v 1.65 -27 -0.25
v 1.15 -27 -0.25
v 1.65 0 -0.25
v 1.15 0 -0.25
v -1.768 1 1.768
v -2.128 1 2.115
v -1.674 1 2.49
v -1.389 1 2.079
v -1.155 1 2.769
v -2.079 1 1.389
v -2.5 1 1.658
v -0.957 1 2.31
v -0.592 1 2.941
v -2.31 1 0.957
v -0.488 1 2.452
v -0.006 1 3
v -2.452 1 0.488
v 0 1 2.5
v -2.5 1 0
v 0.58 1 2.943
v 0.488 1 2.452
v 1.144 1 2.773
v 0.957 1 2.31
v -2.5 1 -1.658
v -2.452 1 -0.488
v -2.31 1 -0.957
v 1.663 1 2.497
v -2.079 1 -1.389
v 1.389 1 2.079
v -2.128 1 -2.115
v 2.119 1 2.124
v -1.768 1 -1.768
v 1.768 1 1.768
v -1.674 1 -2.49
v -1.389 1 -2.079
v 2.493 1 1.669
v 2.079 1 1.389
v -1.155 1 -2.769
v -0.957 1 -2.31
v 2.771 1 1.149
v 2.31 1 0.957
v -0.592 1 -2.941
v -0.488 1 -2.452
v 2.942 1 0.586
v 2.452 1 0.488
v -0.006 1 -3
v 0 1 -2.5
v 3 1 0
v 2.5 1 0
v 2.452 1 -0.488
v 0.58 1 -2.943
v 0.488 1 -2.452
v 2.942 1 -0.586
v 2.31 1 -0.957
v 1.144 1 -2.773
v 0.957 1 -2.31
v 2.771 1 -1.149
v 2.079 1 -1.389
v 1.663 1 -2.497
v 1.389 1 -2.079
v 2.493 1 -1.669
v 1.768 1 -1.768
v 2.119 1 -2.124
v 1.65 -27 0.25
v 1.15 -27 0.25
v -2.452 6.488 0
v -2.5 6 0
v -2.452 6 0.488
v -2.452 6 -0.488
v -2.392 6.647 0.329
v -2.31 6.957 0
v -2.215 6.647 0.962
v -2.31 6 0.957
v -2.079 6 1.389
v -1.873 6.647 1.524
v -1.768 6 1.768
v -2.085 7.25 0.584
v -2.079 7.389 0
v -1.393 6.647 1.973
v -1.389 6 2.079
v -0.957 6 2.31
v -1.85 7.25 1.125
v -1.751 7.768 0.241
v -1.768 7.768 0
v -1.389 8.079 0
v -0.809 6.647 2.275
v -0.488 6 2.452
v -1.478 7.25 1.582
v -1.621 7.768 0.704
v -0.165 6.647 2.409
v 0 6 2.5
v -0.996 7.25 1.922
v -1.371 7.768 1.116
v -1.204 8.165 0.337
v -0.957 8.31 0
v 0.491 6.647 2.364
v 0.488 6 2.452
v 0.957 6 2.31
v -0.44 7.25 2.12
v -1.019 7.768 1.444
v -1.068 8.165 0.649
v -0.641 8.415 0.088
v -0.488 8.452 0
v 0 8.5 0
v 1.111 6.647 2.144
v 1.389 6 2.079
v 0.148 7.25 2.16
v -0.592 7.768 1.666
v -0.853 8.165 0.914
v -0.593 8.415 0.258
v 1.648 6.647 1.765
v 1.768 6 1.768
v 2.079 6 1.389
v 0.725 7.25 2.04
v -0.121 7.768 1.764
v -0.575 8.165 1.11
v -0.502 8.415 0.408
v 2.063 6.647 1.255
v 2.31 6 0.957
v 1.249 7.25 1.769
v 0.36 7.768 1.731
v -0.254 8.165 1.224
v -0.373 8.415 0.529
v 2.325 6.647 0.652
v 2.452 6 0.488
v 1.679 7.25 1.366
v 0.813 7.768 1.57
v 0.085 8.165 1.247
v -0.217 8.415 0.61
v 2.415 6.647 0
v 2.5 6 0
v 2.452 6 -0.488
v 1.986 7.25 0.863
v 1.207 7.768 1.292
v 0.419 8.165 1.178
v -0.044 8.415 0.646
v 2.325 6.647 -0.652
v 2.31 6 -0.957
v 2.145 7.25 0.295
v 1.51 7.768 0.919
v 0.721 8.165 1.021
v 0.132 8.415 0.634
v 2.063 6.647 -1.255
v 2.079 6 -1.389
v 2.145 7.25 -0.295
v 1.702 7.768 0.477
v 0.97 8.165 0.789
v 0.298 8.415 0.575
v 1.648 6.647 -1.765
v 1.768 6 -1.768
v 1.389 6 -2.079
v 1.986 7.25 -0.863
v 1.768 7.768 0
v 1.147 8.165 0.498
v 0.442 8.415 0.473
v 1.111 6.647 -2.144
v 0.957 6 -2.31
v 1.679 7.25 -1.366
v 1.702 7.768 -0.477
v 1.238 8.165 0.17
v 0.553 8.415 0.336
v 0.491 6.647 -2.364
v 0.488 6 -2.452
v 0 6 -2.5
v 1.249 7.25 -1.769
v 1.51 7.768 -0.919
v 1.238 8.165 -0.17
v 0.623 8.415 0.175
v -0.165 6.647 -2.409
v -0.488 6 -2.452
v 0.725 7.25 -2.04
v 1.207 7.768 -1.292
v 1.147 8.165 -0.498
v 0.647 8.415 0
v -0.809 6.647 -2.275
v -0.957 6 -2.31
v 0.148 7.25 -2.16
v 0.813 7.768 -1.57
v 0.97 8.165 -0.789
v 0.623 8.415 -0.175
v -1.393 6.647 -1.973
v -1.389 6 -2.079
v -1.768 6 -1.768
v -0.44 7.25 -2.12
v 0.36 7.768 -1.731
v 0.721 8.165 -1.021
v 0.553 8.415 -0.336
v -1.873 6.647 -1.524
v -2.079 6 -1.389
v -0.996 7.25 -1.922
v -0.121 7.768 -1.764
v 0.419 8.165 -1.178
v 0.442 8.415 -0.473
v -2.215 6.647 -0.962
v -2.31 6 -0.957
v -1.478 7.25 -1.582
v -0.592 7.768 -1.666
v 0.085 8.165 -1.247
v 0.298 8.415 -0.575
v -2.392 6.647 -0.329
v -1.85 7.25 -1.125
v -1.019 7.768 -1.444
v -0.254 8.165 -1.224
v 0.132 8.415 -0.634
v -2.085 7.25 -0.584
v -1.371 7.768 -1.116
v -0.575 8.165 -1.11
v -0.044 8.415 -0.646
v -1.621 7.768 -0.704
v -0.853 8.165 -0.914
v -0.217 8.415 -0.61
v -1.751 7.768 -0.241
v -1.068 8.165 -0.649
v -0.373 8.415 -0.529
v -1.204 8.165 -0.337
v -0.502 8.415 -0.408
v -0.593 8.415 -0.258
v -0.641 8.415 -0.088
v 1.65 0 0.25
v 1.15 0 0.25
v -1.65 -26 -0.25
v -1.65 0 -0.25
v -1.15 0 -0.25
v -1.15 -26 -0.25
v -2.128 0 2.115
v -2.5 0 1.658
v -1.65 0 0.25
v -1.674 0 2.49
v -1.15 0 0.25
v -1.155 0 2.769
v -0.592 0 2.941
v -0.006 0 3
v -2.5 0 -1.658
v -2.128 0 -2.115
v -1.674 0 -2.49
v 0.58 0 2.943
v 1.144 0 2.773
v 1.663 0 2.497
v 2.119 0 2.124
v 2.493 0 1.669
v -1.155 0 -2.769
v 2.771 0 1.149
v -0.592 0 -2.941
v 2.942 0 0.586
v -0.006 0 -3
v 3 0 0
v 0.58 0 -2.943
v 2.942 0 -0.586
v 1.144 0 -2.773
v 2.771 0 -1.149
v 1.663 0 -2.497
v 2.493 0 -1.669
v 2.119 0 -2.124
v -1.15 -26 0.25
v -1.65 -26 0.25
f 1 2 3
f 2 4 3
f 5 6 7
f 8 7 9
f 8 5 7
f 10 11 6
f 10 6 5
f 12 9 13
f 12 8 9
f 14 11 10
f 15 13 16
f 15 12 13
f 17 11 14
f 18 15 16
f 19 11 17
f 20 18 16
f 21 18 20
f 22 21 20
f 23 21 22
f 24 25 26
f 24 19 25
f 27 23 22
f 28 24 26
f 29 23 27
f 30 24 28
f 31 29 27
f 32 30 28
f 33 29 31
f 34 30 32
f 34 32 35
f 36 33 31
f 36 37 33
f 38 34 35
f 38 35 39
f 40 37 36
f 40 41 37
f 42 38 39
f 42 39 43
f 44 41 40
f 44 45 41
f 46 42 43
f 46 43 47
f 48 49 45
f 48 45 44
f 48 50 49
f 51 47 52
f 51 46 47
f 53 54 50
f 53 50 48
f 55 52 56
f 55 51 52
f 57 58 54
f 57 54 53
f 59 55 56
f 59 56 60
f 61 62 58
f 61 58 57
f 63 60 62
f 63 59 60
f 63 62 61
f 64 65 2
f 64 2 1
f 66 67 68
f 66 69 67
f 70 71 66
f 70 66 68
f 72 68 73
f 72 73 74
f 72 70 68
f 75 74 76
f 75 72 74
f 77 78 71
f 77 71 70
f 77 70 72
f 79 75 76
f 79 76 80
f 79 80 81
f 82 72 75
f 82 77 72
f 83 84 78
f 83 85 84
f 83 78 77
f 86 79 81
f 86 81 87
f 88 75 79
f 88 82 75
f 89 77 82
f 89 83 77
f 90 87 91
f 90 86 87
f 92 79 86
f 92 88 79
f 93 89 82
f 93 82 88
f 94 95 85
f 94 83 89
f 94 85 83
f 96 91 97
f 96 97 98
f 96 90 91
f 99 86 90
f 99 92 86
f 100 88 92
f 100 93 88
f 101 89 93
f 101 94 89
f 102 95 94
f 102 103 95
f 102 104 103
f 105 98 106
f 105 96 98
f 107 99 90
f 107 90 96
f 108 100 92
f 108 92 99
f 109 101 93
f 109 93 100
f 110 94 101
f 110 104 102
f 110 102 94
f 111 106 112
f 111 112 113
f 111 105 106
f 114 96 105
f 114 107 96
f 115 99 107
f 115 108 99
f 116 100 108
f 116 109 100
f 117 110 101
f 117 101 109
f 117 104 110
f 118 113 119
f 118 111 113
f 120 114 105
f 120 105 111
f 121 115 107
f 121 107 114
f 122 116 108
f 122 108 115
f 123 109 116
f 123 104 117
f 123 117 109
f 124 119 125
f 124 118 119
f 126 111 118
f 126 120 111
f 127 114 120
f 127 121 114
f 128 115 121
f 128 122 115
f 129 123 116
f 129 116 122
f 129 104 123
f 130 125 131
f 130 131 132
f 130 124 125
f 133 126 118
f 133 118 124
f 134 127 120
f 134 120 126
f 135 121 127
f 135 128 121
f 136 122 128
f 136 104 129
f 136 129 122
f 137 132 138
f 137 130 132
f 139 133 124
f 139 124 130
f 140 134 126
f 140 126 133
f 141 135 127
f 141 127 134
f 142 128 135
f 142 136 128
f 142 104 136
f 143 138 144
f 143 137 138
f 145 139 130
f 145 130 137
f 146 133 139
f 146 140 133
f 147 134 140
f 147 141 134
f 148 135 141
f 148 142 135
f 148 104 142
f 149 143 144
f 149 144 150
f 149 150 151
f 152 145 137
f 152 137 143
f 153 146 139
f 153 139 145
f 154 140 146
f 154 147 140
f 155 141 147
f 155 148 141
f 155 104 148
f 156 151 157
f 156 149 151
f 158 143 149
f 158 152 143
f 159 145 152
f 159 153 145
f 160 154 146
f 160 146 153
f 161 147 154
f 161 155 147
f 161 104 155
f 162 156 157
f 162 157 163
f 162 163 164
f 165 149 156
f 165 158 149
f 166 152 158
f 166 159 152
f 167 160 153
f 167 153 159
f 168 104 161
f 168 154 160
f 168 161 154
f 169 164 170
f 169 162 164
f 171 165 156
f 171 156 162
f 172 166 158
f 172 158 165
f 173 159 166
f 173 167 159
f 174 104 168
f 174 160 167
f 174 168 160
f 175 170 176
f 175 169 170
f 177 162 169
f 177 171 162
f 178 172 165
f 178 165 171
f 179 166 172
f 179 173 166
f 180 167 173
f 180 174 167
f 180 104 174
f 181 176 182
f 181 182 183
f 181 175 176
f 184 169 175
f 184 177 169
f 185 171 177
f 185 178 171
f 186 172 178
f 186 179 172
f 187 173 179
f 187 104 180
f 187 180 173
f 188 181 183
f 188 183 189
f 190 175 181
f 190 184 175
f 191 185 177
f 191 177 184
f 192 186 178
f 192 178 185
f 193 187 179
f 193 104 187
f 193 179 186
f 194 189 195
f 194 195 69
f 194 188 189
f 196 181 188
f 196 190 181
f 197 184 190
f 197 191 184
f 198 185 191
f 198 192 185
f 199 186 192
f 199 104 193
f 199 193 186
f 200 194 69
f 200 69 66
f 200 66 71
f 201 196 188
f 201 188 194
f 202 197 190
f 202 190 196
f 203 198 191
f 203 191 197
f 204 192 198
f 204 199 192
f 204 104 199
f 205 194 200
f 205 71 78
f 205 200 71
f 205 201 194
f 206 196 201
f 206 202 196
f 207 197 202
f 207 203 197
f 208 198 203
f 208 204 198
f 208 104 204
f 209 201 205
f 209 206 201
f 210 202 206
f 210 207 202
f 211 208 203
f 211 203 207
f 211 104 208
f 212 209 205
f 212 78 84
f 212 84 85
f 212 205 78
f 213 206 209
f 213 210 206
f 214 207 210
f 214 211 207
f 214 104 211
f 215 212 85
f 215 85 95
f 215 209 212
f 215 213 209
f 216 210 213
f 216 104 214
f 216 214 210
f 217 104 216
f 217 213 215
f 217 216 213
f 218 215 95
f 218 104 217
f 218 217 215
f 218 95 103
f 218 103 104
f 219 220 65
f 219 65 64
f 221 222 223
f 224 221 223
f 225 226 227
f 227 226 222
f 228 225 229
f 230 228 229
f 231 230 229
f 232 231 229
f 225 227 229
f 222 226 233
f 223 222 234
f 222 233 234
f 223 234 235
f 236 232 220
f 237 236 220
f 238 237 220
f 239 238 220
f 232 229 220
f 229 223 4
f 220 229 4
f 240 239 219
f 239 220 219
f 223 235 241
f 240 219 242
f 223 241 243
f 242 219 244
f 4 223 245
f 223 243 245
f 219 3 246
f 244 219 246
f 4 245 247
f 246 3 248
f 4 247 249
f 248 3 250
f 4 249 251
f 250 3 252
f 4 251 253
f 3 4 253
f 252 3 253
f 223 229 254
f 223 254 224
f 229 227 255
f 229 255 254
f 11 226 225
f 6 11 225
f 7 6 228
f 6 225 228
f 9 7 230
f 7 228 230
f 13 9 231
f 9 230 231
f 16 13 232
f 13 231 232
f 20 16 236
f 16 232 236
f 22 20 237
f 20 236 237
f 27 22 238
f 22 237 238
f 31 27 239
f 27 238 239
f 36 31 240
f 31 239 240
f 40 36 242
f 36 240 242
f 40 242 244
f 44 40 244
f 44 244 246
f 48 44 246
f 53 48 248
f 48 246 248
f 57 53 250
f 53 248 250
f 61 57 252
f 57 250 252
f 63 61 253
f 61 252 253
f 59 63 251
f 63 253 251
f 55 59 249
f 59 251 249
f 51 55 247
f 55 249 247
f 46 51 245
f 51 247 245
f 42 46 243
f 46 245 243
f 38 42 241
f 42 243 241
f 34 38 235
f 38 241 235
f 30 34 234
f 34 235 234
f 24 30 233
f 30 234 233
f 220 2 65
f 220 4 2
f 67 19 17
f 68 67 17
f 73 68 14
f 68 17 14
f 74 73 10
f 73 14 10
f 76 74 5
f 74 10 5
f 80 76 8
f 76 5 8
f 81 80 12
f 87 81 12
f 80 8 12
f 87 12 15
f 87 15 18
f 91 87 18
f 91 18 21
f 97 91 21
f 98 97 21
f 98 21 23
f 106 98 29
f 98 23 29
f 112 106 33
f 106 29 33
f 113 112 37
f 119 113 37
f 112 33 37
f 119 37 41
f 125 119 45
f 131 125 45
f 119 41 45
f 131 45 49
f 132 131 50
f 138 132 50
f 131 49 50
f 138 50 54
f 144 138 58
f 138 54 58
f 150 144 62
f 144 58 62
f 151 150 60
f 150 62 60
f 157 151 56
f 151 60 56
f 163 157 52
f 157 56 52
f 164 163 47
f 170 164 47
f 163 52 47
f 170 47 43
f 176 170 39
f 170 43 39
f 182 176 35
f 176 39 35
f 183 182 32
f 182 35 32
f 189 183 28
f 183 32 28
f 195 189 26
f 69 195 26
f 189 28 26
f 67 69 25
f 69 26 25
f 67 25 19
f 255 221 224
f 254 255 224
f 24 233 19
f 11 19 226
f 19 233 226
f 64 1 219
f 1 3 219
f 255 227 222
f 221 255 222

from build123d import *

# Parameters (mm, degrees)
BOSS_EXTRUDE1_DEPTH = 1
SKETCH2_R           = 2.5
BOSS_EXTRUDE2_DEPTH = 7.5
FILLET1_R           = 2.5
SKETCH3_W           = 0.5
SKETCH3_H           = 0.5
BOSS_EXTRUDE3_DEPTH = 26
SKETCH4_W           = 0.5
SKETCH4_H           = 0.5
BOSS_EXTRUDE4_DEPTH = 1


with BuildPart() as part:
    # Sketch1 → Boss-Extrude1 (new body)
    with BuildSketch(Plane(origin=(0, 0, 0), x_dir=(1, 0, 0), z_dir=(0, 1, 0))):
        with BuildLine():
            Line((-2.5, 1.658312395), (-2.5, -1.658312395))
            ThreePointArc((-2.5, -1.658312395), (3, 0), (-2.5, 1.658312395))
        make_face()
    extrude(amount=BOSS_EXTRUDE1_DEPTH)

    # Sketch2 → Boss-Extrude2 (add)
    with BuildSketch(Plane(origin=(0, 1, 0), x_dir=(1, 0, 0), z_dir=(0, 1, 0))):
        with Locations(Location((0, 0, 0), (0, 0, 180))):
            Circle(SKETCH2_R)
    extrude(amount=BOSS_EXTRUDE2_DEPTH)

    # Fillet1
    fillet1_edges = [part.edges().sort_by_distance(p)[0] for p in [
        (2.5, 8.5, 0),
    ]]
    fillet(fillet1_edges, radius=FILLET1_R)

    # Sketch3 → Boss-Extrude3 (add)
    with BuildSketch(Plane(origin=(0, 0, 0), x_dir=(1, 0, 0), z_dir=(0, 1, 0))):
        with Locations((-1.4, 0)):
            Rectangle(SKETCH3_W, SKETCH3_H)
        with Locations((1.4, 0)):
            Rectangle(SKETCH3_W, SKETCH3_H)
    extrude(amount=-BOSS_EXTRUDE3_DEPTH)

    # Sketch4 → Boss-Extrude4 (add)
    with BuildSketch(Plane.XZ.offset(26)):
        with Locations((1.4, 0)):
            Rectangle(SKETCH4_W, SKETCH4_H)
    extrude(amount=BOSS_EXTRUDE4_DEPTH)


solid = part.part
